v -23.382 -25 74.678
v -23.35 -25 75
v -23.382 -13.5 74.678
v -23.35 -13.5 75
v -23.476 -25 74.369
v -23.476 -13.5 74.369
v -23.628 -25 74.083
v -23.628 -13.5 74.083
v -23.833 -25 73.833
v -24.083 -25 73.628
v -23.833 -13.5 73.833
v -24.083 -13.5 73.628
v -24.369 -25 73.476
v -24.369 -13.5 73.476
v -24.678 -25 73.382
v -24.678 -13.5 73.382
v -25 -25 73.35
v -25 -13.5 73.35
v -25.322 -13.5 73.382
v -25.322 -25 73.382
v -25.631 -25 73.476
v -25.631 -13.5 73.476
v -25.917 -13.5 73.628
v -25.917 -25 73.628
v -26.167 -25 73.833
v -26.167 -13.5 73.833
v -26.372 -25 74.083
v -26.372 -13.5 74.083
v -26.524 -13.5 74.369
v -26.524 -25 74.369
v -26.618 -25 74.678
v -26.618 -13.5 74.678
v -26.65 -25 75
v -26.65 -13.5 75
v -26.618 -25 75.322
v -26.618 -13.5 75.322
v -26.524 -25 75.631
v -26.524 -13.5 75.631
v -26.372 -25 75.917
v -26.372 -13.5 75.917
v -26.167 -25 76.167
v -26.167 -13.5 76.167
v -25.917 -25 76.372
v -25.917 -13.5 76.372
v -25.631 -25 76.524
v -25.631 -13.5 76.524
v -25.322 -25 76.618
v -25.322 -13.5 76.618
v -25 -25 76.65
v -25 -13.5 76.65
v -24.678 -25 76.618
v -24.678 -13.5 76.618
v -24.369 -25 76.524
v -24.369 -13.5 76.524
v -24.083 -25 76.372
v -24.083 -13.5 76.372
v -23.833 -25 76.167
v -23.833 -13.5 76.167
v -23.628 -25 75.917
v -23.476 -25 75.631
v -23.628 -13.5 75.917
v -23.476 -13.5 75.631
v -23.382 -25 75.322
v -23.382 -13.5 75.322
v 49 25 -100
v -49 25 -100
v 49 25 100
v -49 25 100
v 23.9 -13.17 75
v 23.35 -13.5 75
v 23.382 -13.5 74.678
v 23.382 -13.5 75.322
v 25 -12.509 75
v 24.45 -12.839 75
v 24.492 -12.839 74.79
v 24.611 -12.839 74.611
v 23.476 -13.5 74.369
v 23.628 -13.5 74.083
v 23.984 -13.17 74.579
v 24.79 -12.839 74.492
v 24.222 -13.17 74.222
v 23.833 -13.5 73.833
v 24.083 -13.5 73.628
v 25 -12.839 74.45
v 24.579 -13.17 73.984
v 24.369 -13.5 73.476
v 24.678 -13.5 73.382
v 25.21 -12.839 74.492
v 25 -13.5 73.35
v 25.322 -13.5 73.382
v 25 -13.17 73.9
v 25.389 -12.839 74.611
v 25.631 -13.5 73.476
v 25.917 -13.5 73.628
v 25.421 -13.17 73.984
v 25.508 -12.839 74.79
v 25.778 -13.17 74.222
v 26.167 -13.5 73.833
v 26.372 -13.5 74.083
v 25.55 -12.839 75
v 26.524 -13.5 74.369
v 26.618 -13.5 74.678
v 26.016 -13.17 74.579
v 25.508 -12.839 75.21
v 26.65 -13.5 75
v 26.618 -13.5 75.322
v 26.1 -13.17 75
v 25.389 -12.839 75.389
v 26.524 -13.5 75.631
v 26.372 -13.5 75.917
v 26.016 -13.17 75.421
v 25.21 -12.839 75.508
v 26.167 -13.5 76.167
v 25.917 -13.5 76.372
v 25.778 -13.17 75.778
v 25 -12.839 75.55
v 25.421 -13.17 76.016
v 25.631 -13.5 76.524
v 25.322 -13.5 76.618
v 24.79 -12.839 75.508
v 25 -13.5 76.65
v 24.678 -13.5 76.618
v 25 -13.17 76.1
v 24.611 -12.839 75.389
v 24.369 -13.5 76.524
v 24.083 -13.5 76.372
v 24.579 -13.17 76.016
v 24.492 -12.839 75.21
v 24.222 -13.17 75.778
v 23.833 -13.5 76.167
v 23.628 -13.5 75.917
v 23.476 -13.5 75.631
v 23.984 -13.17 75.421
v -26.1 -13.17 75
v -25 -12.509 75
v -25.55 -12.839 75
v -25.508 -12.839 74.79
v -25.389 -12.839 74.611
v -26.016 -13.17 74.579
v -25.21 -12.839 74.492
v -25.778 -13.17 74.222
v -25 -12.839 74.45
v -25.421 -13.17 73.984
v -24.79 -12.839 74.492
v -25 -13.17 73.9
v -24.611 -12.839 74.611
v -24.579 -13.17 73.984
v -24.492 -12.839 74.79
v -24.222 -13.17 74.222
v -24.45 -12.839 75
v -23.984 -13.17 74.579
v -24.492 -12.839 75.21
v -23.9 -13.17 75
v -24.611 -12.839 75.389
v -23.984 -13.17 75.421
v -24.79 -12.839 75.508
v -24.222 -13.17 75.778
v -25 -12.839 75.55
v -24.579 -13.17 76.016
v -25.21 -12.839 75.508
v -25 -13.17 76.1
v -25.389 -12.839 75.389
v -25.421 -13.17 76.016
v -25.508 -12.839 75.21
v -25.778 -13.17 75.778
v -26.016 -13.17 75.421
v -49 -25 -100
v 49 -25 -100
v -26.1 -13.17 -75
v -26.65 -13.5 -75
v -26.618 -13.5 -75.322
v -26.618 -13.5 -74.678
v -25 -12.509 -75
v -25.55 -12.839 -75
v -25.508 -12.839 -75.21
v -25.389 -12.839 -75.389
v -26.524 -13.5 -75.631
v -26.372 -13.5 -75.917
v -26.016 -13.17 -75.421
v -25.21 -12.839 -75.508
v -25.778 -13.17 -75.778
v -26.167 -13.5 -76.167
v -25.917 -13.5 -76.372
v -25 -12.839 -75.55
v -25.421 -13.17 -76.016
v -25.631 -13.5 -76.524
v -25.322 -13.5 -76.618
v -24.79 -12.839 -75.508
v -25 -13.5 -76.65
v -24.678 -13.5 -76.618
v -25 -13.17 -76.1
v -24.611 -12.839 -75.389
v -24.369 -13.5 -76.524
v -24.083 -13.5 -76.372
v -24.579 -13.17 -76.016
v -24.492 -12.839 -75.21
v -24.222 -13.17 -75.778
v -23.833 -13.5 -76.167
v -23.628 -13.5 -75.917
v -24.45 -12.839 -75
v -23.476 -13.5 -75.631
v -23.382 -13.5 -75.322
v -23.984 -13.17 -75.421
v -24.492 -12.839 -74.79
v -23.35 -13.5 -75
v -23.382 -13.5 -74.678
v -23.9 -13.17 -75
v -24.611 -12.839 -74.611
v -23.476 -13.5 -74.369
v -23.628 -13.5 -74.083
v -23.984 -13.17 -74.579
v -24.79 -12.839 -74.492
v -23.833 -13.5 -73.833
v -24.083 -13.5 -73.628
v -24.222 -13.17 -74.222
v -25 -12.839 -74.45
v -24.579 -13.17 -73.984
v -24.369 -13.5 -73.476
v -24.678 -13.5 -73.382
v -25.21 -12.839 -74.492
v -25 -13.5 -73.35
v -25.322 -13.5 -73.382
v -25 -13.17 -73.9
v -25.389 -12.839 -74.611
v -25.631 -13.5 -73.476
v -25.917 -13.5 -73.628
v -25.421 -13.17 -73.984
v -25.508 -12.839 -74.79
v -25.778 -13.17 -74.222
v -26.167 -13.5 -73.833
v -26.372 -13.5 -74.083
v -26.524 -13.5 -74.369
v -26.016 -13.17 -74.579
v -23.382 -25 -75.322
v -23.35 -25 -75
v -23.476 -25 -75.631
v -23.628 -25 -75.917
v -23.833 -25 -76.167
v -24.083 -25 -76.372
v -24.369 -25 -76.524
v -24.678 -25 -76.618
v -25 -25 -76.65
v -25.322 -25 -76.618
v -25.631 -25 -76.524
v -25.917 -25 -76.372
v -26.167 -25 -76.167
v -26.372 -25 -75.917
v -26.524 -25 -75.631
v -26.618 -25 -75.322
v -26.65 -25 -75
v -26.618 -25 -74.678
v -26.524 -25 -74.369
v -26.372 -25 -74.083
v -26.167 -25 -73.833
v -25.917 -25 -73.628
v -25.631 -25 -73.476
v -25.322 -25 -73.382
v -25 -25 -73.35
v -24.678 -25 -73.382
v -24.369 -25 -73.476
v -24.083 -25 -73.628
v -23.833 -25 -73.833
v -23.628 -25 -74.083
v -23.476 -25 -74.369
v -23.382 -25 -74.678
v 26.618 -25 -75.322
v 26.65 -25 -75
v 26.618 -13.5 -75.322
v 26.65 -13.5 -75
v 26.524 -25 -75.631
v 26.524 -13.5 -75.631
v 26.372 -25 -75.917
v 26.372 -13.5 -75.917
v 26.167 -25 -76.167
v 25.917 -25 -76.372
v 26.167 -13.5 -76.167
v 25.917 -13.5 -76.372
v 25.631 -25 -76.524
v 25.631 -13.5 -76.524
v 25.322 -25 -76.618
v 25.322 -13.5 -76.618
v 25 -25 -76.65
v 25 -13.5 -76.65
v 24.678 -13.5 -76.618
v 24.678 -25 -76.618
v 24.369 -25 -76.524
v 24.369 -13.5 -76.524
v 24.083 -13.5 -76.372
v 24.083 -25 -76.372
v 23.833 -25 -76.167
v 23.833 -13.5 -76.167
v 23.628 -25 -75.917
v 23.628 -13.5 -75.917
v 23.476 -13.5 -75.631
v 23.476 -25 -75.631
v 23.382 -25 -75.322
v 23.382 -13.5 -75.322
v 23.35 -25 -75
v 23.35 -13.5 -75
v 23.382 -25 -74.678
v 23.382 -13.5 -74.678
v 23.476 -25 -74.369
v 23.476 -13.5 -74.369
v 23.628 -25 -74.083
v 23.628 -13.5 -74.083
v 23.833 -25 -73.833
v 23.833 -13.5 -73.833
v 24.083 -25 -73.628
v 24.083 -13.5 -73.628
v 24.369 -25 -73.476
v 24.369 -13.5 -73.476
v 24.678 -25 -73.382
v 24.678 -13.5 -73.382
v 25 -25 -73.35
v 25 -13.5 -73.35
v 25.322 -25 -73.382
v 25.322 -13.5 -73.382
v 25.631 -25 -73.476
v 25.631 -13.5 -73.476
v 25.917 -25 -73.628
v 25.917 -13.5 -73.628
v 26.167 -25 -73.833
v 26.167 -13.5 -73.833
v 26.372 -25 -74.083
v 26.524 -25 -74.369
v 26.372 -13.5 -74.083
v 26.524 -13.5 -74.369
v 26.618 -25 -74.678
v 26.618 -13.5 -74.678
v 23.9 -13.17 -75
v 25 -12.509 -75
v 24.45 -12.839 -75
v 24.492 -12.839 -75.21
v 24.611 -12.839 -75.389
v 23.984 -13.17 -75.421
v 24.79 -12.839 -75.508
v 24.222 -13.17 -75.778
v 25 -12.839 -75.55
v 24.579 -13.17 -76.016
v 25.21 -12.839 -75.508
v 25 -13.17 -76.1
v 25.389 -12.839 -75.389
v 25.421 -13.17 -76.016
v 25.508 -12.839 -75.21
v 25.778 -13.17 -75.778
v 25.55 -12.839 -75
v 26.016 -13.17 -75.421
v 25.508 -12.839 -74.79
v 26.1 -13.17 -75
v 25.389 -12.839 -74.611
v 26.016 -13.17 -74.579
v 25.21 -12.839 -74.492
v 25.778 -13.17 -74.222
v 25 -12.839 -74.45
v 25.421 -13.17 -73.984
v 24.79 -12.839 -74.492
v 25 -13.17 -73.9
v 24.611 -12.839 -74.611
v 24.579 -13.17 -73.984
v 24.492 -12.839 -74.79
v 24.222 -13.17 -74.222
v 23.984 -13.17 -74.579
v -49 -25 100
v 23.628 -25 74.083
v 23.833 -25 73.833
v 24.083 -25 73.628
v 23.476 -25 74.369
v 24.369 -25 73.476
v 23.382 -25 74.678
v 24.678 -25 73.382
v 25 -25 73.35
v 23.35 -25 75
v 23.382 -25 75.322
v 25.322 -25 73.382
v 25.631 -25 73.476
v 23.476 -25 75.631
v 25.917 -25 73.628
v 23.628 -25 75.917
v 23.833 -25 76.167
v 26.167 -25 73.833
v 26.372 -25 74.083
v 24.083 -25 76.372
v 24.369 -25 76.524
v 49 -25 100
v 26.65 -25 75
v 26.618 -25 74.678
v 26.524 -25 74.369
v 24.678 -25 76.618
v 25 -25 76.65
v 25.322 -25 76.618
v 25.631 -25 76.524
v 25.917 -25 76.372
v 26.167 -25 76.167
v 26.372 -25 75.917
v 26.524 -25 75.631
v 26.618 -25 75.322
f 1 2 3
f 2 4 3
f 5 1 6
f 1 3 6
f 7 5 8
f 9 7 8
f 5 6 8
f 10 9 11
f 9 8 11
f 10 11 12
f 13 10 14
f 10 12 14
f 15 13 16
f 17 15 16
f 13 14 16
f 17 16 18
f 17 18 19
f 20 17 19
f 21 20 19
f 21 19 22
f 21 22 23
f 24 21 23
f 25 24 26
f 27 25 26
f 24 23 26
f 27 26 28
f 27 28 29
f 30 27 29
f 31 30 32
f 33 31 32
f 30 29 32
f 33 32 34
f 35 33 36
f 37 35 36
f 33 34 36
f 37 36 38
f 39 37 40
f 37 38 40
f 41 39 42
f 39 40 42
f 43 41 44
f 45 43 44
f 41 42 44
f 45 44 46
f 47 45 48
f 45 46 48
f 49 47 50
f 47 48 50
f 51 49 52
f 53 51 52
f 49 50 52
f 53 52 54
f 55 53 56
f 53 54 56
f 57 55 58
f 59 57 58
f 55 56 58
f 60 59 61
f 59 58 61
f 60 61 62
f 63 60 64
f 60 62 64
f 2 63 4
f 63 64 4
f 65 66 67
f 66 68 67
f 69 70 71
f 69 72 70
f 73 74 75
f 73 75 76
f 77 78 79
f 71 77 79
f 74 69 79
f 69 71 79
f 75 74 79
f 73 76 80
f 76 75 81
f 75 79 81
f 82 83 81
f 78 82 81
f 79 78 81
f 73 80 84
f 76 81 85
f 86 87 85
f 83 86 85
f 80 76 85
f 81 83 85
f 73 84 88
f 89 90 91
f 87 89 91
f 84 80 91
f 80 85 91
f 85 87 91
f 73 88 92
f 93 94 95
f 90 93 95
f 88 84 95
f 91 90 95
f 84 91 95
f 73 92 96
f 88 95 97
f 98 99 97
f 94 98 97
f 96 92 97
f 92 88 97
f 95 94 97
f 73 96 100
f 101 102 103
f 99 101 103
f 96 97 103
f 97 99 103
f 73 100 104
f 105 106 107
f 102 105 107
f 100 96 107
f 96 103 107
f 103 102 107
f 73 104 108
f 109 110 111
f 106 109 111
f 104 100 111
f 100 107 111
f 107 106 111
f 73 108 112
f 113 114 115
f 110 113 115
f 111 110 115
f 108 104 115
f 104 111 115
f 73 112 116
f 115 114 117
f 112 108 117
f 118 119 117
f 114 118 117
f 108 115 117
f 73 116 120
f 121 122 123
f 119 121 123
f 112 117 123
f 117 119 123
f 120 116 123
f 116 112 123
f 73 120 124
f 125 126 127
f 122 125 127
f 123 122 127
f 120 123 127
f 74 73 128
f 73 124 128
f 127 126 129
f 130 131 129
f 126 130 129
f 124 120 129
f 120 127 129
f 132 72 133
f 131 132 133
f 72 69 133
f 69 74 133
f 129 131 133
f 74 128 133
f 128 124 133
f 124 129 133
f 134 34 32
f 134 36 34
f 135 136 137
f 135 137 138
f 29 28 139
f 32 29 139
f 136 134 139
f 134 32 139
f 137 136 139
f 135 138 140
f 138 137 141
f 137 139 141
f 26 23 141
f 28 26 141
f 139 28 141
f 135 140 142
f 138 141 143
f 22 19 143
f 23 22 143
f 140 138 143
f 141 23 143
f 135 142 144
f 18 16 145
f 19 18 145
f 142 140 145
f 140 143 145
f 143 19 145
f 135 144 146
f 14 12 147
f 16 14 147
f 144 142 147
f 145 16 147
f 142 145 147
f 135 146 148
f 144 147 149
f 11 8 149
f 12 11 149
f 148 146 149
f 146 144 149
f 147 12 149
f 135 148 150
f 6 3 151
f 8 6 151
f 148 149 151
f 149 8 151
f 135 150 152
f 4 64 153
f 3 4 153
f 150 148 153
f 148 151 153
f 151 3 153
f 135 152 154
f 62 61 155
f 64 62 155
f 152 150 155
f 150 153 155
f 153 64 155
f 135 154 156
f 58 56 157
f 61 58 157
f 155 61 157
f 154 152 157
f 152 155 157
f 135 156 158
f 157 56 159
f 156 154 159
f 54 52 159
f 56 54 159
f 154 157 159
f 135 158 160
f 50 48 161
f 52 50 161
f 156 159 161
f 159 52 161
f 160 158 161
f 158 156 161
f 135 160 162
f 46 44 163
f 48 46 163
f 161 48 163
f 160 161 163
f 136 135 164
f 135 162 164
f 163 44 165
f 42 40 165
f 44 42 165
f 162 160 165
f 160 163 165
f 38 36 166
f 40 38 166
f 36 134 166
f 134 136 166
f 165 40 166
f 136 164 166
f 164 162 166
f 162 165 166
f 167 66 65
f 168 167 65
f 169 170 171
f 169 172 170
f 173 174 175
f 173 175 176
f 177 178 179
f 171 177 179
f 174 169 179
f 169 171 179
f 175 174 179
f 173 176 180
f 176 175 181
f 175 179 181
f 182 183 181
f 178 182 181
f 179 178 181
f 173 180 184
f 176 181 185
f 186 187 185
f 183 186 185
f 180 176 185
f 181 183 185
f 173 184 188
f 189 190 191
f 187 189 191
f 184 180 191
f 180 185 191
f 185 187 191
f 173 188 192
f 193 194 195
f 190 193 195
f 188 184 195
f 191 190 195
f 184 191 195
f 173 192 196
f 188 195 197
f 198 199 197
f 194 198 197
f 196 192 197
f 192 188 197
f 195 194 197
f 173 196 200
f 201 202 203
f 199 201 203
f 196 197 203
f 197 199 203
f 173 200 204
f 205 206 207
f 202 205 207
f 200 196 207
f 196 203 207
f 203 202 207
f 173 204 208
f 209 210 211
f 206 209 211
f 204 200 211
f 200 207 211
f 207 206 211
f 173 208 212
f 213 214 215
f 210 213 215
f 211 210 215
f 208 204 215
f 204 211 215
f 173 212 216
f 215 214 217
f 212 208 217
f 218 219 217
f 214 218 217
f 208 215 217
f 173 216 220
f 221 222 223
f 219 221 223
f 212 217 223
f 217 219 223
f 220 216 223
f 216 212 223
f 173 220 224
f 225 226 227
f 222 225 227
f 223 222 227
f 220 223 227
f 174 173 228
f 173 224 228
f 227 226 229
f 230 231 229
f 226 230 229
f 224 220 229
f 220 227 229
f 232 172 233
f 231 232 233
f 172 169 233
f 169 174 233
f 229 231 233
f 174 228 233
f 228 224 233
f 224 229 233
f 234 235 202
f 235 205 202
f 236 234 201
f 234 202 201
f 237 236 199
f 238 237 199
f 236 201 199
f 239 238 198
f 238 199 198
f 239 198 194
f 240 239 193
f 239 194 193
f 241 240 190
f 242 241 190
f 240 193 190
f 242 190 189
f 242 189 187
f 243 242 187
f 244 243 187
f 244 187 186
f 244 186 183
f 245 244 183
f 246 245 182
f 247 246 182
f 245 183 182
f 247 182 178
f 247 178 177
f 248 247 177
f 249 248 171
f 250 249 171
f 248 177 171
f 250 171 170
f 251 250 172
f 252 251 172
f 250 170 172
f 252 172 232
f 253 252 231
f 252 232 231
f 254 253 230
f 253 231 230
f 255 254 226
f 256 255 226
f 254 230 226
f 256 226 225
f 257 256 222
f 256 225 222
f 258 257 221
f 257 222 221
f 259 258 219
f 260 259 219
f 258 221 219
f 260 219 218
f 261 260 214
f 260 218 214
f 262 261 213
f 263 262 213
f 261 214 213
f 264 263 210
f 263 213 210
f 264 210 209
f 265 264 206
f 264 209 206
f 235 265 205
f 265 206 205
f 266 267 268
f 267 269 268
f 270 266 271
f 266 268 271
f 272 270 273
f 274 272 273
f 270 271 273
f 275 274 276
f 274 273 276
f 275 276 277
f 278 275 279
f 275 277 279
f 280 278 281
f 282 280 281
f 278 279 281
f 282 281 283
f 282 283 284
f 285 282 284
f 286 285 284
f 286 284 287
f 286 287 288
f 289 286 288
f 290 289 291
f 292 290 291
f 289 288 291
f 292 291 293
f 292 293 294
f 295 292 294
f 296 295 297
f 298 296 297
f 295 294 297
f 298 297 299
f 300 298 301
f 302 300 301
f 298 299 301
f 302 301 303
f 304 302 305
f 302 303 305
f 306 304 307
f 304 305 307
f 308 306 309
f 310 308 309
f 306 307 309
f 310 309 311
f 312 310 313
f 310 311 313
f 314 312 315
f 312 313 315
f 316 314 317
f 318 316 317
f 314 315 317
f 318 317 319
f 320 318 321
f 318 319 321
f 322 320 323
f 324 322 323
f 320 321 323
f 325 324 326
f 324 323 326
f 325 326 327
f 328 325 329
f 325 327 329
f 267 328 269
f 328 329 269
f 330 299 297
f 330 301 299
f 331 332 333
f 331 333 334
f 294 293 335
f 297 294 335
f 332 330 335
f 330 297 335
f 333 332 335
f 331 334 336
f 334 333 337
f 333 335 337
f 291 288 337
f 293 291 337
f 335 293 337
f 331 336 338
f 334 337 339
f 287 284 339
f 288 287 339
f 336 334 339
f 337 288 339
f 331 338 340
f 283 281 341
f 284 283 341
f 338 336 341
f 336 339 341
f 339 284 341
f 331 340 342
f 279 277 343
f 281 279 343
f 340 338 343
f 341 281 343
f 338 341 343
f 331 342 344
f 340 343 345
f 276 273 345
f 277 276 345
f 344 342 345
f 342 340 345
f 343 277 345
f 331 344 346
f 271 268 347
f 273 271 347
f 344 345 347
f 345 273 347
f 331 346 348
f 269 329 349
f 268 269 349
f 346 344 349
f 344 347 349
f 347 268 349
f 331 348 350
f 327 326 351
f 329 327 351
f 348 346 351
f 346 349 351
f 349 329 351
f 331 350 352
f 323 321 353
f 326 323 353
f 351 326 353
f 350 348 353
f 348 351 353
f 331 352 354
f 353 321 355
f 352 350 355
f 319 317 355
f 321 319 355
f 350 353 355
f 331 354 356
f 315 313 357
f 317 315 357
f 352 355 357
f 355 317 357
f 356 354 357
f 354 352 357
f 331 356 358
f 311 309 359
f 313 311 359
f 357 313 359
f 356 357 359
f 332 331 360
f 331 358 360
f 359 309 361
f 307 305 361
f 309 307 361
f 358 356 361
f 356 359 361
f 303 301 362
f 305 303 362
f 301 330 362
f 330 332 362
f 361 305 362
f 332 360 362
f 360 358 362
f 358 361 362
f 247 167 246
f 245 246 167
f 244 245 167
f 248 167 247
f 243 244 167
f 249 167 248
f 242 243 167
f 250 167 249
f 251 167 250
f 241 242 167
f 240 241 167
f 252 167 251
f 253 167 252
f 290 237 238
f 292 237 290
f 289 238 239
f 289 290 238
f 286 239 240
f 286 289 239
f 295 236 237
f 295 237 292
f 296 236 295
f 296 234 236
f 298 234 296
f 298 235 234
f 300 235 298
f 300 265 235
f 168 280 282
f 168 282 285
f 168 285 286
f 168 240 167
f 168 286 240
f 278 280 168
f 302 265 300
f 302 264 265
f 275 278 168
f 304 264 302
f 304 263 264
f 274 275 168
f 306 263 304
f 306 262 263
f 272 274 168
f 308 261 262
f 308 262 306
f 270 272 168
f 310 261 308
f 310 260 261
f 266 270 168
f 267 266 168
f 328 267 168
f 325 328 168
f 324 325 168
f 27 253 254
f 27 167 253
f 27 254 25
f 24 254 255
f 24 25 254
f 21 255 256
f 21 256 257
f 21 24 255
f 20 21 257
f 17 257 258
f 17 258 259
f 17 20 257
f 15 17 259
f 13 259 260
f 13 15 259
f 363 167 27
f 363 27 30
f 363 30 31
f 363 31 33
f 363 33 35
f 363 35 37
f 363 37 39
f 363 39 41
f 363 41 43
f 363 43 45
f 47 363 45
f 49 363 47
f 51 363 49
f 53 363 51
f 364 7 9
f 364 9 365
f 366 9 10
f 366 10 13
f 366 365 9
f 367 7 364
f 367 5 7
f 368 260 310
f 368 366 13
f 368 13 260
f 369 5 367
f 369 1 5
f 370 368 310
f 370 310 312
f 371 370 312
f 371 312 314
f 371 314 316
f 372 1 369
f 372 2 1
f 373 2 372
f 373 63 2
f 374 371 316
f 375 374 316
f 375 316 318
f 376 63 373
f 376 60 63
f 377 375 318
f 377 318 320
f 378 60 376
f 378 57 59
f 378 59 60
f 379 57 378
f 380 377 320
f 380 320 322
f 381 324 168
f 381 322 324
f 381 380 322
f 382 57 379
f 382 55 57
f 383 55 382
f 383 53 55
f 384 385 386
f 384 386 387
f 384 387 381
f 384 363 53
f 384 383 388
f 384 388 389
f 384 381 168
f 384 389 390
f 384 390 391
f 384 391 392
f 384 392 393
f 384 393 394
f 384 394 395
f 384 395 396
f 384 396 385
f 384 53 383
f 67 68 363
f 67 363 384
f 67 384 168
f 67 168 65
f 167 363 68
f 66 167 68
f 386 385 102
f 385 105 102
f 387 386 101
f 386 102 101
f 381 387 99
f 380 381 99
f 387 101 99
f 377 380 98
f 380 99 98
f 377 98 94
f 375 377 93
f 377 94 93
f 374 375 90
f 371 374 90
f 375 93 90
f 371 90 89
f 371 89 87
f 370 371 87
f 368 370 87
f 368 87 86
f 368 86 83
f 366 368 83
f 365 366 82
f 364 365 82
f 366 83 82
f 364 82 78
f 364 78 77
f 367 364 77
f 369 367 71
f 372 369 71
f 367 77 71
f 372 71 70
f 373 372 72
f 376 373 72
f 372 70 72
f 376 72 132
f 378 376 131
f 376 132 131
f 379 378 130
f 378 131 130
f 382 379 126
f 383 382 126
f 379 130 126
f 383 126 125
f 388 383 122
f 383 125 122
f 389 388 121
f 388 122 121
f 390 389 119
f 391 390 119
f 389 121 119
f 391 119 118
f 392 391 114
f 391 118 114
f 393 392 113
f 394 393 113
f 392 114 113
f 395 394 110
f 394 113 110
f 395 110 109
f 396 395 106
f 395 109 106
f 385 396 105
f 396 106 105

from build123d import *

# Parameters (mm, degrees)
SKETCH_1_W            = 98
SKETCH_1_H            = 50
EXTRUDE_305_DEPTH     = 100
HOLE_WIZARD_M41_D     = 3.3
HOLE_WIZARD_M41_DEPTH = 11.5
HOLE_WIZARD_M41_TIP   = 0.991420021


with BuildPart() as part:
    # Эскиз1 → Extrude 305 (new, symmetric)
    with BuildSketch(Plane.XY):
        Rectangle(SKETCH_1_W, SKETCH_1_H)
    extrude(amount=EXTRUDE_305_DEPTH, both=True)

    # Отверстие обработанное метчиком M41
    with Locations(Plane(origin=(0, -25, 0), x_dir=(-1, 0, 0), z_dir=(0, -1, 0))):
        with Locations((25, -75), (-25, -75), (-25, 75), (25, 75)):
            Hole(HOLE_WIZARD_M41_D / 2, depth=HOLE_WIZARD_M41_DEPTH)
            with Locations((0, 0, -(HOLE_WIZARD_M41_DEPTH + HOLE_WIZARD_M41_TIP / 2))):  # 118° drill point
                Cone(0, HOLE_WIZARD_M41_D / 2, HOLE_WIZARD_M41_TIP, mode=Mode.SUBTRACT)


solid = part.part
